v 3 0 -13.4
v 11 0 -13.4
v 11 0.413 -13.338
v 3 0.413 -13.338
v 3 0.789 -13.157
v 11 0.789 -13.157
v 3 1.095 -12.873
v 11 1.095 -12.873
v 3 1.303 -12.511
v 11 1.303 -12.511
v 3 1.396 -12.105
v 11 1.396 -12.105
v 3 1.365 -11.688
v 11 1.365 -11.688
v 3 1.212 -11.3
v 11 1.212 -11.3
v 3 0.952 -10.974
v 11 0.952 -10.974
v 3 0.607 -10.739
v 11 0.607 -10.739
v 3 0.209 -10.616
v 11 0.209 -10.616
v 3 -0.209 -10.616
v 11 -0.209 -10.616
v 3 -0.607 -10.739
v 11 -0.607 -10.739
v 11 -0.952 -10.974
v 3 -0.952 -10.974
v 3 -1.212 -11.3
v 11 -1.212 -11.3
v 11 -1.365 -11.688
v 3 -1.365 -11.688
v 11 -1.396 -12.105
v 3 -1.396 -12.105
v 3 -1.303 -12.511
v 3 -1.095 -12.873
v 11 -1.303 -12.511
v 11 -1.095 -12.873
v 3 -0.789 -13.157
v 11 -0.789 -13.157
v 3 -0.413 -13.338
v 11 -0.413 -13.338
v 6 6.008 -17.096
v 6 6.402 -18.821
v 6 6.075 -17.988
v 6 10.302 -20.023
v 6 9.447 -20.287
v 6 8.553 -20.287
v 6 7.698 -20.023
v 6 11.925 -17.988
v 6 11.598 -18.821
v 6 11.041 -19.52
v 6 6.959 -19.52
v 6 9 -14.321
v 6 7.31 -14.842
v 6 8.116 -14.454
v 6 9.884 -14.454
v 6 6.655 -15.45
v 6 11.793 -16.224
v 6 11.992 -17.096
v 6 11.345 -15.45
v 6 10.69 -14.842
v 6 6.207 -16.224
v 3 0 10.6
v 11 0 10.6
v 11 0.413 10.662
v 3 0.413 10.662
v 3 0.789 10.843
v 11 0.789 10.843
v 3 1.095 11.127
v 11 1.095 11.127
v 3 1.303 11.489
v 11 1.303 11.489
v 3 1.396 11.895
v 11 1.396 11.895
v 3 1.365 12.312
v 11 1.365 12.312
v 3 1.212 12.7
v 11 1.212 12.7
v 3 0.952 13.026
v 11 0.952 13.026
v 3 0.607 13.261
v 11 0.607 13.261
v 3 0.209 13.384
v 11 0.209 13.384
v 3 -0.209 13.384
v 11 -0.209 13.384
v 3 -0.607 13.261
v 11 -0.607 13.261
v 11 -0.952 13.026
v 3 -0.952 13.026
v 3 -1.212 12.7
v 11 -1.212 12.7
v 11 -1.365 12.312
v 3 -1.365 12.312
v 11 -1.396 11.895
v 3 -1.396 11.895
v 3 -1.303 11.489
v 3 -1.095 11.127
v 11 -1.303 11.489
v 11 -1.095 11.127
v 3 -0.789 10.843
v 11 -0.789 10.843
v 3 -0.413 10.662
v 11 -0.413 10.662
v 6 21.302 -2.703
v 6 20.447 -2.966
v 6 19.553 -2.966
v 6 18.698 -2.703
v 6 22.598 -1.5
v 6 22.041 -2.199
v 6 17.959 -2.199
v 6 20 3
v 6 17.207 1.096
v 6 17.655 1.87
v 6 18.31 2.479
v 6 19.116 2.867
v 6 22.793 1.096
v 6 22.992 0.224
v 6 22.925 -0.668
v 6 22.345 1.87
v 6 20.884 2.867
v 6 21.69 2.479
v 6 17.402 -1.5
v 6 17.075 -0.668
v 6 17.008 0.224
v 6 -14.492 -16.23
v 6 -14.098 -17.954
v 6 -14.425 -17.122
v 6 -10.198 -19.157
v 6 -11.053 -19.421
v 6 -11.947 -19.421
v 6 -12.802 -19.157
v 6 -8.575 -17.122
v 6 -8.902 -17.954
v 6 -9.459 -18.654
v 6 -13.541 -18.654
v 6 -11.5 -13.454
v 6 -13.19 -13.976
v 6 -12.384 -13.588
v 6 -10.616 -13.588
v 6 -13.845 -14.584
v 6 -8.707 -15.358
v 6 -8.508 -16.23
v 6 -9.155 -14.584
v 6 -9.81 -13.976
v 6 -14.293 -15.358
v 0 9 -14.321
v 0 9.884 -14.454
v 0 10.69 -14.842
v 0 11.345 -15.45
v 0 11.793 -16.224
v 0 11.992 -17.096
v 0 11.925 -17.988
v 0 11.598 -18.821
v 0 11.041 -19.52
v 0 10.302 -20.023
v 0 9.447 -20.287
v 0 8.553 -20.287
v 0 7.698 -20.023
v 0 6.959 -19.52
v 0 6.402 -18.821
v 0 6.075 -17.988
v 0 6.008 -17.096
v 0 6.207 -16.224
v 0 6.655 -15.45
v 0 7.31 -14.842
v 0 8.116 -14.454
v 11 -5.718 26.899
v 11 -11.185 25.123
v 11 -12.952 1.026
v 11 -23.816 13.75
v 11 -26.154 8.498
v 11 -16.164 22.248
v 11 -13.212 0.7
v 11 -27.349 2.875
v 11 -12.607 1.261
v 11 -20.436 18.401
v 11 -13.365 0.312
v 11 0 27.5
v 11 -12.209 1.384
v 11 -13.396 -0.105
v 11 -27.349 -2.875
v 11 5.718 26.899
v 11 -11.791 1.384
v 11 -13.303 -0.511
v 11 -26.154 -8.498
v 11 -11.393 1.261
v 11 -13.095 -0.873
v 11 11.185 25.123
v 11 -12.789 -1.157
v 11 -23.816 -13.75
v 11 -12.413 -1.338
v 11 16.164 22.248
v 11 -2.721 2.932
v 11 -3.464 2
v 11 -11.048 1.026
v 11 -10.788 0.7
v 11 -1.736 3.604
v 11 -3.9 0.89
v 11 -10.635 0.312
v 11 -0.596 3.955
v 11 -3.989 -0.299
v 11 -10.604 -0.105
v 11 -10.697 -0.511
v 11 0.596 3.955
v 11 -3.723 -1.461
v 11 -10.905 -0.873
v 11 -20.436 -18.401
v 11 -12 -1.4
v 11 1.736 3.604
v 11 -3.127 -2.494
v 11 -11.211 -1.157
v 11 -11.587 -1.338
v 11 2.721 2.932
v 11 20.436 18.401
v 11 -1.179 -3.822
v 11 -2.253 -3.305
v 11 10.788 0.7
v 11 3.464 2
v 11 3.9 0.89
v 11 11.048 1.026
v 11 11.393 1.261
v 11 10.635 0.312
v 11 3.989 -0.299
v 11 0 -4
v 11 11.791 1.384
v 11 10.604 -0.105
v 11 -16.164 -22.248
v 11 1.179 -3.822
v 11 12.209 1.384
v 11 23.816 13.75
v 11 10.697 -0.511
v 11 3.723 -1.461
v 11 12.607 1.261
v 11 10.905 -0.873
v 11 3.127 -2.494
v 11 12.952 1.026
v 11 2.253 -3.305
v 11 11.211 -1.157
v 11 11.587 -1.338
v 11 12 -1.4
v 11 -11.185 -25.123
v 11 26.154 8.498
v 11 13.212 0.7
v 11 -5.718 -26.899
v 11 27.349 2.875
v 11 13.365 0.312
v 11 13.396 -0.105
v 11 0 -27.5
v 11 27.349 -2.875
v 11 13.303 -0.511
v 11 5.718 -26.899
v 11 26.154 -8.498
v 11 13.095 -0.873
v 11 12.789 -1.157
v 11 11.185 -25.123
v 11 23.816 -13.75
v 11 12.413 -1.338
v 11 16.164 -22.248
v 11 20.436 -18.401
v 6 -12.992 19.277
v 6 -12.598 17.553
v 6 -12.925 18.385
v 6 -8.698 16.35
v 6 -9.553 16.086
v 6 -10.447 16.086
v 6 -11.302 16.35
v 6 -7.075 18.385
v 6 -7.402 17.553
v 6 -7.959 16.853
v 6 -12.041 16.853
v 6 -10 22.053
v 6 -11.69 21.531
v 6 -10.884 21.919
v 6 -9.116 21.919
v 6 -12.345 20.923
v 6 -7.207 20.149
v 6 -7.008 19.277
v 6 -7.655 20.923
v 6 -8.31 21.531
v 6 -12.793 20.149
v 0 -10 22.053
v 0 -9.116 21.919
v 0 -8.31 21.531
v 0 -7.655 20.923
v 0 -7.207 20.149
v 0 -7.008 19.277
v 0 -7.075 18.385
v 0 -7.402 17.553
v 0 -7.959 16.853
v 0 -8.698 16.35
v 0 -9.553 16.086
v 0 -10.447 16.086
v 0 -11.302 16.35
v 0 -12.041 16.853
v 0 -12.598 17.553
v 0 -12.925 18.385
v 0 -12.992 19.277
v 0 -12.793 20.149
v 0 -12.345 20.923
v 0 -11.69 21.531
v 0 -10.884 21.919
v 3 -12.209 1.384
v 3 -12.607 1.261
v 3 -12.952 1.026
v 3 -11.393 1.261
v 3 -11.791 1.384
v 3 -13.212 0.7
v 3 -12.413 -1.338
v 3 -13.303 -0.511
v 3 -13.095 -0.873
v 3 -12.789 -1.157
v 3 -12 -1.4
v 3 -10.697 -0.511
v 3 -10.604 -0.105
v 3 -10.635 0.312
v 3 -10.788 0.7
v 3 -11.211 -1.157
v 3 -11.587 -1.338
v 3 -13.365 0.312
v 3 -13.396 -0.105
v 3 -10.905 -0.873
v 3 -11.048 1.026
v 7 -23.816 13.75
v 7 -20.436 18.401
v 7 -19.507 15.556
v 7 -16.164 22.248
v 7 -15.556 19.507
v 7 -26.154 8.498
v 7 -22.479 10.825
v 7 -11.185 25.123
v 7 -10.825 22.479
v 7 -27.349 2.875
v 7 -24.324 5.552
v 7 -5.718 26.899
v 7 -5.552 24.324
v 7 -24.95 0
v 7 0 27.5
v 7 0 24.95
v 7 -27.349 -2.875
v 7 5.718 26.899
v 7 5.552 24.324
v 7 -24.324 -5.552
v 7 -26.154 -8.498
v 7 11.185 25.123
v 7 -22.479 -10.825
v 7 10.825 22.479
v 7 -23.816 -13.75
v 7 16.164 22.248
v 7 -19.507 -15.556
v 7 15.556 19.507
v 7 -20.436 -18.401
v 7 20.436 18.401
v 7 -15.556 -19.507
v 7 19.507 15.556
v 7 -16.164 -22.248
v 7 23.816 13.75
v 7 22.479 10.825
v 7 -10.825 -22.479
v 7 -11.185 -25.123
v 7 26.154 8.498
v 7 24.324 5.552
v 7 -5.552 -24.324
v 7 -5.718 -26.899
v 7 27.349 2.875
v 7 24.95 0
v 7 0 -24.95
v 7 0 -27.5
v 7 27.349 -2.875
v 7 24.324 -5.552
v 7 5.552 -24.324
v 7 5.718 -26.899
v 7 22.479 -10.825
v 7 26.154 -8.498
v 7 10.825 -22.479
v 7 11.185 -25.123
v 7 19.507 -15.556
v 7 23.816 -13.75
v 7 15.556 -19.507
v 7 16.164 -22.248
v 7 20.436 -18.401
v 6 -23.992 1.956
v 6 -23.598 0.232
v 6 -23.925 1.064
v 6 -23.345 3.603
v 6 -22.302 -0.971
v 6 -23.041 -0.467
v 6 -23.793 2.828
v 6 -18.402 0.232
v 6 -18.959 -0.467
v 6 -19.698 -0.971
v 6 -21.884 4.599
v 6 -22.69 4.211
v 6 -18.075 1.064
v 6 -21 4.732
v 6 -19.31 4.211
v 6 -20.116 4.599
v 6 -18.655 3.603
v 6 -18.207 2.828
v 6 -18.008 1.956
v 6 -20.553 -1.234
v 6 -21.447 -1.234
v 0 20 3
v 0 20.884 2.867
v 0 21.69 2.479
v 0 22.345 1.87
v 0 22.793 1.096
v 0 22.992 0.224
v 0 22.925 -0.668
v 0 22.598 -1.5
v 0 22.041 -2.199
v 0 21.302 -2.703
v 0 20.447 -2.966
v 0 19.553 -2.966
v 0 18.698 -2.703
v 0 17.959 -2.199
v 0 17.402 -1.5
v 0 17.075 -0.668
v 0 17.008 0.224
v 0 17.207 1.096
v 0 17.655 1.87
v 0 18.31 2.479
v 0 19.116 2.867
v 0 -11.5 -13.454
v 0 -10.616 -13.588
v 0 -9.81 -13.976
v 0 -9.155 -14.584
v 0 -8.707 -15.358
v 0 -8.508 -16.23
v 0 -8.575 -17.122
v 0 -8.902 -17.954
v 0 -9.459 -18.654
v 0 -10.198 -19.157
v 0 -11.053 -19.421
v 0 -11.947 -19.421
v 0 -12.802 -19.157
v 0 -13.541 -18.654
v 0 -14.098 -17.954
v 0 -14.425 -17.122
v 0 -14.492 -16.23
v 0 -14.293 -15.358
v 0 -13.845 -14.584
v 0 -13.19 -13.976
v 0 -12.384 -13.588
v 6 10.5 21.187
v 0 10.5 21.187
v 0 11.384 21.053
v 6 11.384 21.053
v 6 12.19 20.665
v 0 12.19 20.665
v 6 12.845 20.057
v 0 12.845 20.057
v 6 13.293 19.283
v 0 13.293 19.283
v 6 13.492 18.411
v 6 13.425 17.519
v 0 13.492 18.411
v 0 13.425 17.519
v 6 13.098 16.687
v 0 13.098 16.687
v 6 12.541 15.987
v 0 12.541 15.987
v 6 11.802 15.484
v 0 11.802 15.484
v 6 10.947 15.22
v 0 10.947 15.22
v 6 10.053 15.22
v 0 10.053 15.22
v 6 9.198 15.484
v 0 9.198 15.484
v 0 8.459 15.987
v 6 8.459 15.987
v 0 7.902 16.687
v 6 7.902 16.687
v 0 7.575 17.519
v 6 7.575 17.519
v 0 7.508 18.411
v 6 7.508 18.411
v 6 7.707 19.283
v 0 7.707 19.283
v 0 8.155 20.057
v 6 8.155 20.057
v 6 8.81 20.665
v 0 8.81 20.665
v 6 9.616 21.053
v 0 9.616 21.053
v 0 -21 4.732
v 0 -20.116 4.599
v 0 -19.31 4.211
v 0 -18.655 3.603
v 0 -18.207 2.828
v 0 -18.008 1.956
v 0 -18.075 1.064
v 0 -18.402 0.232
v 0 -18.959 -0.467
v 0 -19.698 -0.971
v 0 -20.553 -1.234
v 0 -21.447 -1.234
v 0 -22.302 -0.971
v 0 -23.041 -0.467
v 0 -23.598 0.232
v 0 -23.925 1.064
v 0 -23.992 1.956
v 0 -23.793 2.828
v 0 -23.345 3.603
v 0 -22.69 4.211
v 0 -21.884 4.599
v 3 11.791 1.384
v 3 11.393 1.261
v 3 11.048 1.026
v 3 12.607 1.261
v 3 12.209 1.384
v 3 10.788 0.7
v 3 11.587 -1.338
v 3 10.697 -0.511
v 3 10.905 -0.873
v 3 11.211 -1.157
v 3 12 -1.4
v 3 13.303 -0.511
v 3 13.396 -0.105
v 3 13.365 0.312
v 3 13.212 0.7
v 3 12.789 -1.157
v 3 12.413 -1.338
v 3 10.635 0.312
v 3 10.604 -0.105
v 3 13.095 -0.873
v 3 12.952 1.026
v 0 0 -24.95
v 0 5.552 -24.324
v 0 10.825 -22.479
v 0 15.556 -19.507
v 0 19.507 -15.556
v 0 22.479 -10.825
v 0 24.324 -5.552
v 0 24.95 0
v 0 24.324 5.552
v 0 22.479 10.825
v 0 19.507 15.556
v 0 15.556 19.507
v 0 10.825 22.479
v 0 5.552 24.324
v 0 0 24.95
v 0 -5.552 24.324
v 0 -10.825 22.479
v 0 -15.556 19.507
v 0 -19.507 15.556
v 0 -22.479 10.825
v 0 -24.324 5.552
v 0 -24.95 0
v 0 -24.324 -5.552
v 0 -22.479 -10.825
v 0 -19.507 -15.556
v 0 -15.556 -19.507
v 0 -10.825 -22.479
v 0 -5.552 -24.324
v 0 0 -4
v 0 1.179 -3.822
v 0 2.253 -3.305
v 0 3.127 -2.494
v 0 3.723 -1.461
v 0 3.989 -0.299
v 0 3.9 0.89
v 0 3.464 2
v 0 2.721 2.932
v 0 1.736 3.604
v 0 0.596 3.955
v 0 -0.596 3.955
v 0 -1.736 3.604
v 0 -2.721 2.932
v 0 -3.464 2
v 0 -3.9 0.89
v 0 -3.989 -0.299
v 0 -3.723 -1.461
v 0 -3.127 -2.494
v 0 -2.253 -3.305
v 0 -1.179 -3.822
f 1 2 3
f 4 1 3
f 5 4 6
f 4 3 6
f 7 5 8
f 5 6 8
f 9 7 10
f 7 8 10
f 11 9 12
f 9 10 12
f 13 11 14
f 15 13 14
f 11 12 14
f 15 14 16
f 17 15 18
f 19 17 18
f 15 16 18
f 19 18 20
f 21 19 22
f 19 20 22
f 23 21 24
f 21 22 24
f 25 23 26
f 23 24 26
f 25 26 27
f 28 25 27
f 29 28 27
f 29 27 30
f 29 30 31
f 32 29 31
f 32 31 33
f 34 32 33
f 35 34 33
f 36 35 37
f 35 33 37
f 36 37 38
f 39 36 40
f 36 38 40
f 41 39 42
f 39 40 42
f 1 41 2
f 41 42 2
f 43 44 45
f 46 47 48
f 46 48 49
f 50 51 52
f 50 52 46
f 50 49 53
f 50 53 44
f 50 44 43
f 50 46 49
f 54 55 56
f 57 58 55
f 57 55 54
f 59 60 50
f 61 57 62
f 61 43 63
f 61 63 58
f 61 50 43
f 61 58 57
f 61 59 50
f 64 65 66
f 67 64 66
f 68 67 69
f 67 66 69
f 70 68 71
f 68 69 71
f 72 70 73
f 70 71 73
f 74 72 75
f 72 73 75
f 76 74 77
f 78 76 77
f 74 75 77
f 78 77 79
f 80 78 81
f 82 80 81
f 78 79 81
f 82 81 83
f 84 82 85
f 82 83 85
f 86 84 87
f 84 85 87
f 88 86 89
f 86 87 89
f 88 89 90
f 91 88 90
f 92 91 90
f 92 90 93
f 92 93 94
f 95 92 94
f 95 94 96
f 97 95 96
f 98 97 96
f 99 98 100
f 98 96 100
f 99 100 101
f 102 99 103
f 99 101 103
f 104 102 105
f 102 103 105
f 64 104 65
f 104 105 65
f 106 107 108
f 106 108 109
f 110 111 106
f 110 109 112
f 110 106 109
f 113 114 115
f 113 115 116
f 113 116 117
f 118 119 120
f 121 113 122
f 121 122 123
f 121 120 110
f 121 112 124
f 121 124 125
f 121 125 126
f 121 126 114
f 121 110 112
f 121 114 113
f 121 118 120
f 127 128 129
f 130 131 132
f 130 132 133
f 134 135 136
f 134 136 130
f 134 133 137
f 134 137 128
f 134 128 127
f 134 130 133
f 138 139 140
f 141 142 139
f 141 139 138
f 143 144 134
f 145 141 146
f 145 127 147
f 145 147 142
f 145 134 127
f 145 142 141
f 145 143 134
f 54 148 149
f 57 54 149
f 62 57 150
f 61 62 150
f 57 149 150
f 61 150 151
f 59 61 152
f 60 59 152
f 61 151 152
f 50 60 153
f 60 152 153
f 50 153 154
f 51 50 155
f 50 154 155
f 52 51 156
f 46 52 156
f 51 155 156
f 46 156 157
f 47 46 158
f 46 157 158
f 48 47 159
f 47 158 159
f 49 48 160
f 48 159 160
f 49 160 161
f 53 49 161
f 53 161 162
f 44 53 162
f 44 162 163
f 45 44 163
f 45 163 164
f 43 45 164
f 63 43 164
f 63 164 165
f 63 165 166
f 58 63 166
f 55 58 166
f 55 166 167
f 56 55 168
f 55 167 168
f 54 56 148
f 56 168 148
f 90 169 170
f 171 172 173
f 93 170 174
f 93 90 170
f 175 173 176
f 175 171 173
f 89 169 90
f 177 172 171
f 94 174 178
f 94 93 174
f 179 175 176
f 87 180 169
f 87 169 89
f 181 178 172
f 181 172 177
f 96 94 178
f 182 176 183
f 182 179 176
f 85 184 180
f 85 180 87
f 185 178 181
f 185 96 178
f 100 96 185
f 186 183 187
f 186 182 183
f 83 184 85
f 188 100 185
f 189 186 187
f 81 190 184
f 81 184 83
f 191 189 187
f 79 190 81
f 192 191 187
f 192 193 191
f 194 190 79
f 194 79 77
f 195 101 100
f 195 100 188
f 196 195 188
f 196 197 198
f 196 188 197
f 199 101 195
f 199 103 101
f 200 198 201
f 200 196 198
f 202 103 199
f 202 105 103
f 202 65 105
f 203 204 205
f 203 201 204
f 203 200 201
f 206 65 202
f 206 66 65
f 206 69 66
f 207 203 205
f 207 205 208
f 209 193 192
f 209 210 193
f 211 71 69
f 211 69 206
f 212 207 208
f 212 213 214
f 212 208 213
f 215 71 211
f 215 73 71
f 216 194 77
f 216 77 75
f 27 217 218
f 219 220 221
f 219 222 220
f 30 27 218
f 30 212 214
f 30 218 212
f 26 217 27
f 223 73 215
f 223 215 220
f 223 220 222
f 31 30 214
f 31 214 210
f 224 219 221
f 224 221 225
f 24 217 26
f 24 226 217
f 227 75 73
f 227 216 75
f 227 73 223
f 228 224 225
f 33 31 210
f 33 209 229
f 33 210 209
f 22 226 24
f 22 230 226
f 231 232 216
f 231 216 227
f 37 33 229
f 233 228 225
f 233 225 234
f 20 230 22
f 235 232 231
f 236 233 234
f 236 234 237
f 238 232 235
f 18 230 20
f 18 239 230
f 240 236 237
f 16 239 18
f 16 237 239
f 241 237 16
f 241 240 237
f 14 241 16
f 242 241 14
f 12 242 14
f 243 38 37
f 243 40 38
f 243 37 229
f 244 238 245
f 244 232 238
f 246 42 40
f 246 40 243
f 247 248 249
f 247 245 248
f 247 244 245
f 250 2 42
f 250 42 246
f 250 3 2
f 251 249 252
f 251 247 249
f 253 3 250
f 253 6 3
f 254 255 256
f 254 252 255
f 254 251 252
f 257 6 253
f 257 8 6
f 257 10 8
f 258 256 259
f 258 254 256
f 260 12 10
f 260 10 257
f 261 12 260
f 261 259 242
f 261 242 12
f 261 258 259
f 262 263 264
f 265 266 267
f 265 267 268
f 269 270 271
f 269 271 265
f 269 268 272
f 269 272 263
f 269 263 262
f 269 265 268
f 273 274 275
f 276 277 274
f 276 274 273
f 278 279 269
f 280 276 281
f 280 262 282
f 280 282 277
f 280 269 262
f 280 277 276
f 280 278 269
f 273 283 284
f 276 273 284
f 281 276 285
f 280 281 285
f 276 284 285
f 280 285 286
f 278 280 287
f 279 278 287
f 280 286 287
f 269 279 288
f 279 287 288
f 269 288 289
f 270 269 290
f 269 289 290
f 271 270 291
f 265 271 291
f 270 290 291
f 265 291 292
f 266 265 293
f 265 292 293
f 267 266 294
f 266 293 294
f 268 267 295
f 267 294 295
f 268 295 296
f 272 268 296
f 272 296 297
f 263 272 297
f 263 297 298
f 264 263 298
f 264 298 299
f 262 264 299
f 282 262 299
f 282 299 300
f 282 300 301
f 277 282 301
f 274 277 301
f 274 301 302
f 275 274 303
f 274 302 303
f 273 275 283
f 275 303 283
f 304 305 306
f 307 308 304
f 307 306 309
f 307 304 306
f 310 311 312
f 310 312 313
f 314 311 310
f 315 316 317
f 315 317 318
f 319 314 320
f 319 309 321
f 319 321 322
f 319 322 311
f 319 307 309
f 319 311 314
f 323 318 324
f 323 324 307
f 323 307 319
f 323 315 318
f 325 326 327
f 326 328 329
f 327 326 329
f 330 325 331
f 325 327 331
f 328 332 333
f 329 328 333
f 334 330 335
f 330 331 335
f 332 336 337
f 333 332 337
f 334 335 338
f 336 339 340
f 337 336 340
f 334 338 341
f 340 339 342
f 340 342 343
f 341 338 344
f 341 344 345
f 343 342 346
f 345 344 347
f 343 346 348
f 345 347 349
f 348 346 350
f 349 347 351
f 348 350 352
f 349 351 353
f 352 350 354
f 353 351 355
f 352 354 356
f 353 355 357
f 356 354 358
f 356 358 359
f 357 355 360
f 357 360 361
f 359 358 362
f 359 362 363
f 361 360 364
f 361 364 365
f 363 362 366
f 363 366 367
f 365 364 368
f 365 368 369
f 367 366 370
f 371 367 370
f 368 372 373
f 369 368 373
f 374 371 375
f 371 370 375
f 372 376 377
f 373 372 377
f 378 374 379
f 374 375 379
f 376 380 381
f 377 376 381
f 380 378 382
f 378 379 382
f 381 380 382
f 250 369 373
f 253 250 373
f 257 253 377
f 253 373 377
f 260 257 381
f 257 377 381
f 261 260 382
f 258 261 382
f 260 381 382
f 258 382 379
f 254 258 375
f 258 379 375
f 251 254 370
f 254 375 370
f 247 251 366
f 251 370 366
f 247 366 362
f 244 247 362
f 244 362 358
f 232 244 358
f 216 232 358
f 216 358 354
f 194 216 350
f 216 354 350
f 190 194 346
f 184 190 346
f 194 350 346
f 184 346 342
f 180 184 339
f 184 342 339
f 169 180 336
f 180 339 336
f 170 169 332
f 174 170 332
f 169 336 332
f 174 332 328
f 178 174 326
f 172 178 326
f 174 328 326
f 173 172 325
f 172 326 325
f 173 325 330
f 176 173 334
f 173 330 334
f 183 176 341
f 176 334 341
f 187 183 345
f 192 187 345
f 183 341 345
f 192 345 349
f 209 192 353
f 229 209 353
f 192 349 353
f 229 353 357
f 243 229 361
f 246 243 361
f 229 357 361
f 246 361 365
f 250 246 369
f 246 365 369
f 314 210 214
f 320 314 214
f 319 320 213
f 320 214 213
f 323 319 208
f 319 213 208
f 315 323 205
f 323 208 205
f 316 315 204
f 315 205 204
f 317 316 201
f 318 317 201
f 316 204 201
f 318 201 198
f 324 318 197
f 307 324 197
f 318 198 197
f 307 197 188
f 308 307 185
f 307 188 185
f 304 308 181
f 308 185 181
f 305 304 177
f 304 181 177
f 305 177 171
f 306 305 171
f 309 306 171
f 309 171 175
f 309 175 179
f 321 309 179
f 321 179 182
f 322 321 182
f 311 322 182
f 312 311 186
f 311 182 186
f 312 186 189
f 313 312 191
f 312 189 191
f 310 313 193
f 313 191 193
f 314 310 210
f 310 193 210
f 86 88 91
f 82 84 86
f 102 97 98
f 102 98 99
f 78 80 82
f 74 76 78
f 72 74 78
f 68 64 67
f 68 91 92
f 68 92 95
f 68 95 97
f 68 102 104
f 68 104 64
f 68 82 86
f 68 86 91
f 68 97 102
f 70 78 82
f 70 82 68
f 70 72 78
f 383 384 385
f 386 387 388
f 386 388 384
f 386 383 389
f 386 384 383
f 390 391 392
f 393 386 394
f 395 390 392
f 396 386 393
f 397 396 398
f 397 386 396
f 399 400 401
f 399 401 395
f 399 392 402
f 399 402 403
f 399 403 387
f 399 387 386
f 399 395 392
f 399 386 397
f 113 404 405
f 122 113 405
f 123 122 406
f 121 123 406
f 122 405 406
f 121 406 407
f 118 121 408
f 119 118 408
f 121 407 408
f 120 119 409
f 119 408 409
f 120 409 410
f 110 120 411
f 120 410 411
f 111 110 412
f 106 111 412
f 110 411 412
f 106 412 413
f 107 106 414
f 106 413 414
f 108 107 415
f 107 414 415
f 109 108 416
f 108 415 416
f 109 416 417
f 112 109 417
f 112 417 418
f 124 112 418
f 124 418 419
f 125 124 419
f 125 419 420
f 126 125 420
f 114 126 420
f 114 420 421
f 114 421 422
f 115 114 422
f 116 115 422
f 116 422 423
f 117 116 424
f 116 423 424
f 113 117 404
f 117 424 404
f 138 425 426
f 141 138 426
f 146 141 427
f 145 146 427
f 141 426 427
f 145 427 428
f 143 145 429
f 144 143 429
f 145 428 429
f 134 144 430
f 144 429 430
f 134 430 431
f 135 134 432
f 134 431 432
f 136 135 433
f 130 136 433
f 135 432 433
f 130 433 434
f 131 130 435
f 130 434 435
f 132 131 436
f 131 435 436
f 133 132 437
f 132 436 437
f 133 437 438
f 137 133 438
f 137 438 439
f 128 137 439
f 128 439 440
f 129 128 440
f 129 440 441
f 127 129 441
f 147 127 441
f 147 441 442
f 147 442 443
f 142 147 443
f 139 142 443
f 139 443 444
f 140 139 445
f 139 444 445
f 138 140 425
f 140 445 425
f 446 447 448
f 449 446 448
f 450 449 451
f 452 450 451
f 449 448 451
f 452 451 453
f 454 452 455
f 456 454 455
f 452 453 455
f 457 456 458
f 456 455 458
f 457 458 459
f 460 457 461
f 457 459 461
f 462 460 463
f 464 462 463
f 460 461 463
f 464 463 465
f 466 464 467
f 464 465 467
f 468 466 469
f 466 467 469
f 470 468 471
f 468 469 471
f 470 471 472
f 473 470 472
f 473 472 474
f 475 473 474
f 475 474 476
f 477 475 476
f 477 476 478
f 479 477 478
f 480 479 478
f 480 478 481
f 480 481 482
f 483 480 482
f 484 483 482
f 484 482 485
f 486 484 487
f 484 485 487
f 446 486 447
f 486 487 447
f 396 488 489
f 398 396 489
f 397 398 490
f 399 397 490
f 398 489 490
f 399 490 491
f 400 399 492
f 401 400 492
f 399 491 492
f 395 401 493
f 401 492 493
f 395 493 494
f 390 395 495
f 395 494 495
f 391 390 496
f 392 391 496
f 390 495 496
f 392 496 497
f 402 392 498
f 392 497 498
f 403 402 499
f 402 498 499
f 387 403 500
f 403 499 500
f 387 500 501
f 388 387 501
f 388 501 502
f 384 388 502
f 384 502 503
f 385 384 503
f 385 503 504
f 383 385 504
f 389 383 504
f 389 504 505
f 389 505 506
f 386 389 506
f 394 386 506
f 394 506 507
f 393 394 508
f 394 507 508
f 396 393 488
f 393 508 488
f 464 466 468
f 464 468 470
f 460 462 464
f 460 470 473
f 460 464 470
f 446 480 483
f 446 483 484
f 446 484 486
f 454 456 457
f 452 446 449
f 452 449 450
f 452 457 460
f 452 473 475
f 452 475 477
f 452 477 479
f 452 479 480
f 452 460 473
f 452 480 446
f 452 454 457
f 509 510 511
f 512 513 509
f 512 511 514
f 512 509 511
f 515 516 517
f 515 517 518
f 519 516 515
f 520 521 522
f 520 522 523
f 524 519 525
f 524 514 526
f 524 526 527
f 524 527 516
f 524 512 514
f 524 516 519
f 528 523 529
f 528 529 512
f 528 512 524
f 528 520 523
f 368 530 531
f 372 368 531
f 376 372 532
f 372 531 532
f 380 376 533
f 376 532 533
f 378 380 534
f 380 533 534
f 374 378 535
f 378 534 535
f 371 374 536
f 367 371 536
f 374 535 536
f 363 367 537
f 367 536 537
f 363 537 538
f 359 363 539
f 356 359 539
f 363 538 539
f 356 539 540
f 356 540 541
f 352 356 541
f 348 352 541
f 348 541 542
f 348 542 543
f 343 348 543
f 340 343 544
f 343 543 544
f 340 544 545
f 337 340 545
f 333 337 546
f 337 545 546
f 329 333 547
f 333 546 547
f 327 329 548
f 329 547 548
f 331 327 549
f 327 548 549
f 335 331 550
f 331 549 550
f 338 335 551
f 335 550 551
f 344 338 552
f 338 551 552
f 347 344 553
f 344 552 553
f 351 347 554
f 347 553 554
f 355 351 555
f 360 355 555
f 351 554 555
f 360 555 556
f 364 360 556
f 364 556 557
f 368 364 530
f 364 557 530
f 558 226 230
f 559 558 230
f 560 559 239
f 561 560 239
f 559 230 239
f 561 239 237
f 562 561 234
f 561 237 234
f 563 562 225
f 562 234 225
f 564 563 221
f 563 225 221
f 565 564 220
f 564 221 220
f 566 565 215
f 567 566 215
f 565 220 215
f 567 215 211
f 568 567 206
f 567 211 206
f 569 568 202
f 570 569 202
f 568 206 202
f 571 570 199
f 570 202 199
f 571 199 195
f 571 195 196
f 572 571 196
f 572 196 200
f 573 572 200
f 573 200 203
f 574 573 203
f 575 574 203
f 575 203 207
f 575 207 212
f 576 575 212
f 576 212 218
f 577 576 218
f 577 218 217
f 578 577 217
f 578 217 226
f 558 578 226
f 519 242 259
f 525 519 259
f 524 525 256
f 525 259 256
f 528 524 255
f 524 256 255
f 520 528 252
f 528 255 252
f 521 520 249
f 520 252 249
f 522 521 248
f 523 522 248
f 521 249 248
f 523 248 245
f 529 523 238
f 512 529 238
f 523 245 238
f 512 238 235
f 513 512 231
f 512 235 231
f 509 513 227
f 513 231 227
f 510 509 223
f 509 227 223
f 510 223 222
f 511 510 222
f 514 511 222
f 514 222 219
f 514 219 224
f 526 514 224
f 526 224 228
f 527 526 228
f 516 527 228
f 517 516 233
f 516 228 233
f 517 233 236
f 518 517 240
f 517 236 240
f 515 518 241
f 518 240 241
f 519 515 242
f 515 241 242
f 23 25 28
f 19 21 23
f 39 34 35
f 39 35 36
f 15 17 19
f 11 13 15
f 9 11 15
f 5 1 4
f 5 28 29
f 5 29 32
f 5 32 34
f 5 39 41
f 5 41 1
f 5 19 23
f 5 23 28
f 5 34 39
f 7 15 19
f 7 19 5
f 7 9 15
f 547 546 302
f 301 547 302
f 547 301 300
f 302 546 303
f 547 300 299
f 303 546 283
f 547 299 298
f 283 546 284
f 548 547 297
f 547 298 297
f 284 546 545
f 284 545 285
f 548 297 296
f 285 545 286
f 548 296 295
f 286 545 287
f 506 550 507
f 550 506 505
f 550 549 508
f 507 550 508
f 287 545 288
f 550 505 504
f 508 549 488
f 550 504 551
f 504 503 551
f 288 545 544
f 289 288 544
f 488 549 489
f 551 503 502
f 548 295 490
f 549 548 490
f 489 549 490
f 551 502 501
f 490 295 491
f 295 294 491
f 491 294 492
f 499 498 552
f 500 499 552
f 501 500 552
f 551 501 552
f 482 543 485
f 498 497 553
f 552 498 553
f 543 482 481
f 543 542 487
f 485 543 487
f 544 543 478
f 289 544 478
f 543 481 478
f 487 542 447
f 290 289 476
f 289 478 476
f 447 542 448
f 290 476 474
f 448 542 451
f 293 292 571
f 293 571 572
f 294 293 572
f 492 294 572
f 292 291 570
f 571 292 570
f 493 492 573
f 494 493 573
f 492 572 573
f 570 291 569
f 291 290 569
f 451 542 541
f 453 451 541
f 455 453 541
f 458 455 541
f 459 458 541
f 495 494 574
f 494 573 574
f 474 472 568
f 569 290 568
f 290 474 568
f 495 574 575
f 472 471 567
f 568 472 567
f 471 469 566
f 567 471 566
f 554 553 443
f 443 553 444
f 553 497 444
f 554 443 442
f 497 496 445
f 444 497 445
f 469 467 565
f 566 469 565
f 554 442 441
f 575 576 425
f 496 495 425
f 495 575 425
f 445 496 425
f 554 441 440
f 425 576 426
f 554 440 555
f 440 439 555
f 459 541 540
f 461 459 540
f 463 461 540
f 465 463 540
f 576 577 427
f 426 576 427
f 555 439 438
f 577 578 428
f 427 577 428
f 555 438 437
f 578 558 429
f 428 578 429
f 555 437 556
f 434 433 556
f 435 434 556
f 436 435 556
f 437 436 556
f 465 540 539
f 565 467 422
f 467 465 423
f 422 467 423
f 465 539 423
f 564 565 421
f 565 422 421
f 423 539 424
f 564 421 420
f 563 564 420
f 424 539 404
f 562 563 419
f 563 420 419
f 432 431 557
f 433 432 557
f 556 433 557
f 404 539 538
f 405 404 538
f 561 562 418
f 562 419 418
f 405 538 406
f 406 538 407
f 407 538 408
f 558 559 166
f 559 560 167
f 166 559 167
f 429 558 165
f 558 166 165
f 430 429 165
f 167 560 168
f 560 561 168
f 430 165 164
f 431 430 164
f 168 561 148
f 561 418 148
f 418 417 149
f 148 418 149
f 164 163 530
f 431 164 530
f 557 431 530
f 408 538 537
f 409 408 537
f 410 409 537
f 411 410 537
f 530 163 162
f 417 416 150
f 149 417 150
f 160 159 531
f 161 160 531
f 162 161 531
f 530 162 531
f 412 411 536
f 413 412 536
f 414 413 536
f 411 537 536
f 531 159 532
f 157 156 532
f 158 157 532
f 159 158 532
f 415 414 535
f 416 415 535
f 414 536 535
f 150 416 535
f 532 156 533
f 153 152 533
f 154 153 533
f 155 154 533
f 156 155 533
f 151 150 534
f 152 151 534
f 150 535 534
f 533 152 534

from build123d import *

# Parameters (mm, degrees)
SKETCH1_R          = 24.95
HUB_DEPTH          = 7
SKETCH2_R          = 27.5
SHOULDER_DEPTH     = 4
SKETCH3_R          = 4
CUT_EXTRUDE1_DEPTH = 41.416580756
SKETCH5_R          = 1.4
CUT_EXTRUDE3_DEPTH = 8
SKETCH6_R          = 3
CUT_EXTRUDE4_DEPTH = 6


with BuildPart() as part:
    # Sketch1 → Hub (new body)
    with BuildSketch(Plane(origin=(0, 0, 0), x_dir=(0, 0, -1), z_dir=(1, 0, 0))):
        Circle(SKETCH1_R)
    extrude(amount=HUB_DEPTH)

    # Sketch2 → Shoulder (add)
    with BuildSketch(Plane(origin=(7, 0, 0), x_dir=(0, 0, -1), z_dir=(1, 0, 0))):
        Circle(SKETCH2_R)
    extrude(amount=SHOULDER_DEPTH)

    # Sketch3 → Cut-Extrude1 (cut, through all)
    with BuildSketch(Plane(origin=(11, 0, 0), x_dir=(0, 0, -1), z_dir=(1, 0, 0))):
        Circle(SKETCH3_R)
    extrude(amount=-CUT_EXTRUDE1_DEPTH, mode=Mode.SUBTRACT)

    # Sketch5 → Cut-Extrude3 (cut)
    with BuildSketch(Plane(origin=(11, 0, 0), x_dir=(0, 0, -1), z_dir=(1, 0, 0))):
        with Locations((-12, 0)):
            Circle(SKETCH5_R)
        with Locations((0, 12)):
            Circle(SKETCH5_R)
        with Locations((12, 0)):
            Circle(SKETCH5_R)
        with Locations((0, -12)):
            Circle(SKETCH5_R)
    extrude(amount=-CUT_EXTRUDE3_DEPTH, mode=Mode.SUBTRACT)

    # Sketch6 → Cut-Extrude4 (cut)
    with BuildSketch(Plane.ZY):
        with Locations((0, 20)):
            Circle(SKETCH6_R)
        with Locations((18.186533479, 10.5)):
            Circle(SKETCH6_R)
        with Locations((19.052558883, -10)):
            Circle(SKETCH6_R)
        with Locations((1.732050808, -21)):
            Circle(SKETCH6_R)
        with Locations((-16.454482672, -11.5)):
            Circle(SKETCH6_R)
        with Locations((-17.320508076, 9)):
            Circle(SKETCH6_R)
    extrude(amount=-CUT_EXTRUDE4_DEPTH, mode=Mode.SUBTRACT)


solid = part.part
